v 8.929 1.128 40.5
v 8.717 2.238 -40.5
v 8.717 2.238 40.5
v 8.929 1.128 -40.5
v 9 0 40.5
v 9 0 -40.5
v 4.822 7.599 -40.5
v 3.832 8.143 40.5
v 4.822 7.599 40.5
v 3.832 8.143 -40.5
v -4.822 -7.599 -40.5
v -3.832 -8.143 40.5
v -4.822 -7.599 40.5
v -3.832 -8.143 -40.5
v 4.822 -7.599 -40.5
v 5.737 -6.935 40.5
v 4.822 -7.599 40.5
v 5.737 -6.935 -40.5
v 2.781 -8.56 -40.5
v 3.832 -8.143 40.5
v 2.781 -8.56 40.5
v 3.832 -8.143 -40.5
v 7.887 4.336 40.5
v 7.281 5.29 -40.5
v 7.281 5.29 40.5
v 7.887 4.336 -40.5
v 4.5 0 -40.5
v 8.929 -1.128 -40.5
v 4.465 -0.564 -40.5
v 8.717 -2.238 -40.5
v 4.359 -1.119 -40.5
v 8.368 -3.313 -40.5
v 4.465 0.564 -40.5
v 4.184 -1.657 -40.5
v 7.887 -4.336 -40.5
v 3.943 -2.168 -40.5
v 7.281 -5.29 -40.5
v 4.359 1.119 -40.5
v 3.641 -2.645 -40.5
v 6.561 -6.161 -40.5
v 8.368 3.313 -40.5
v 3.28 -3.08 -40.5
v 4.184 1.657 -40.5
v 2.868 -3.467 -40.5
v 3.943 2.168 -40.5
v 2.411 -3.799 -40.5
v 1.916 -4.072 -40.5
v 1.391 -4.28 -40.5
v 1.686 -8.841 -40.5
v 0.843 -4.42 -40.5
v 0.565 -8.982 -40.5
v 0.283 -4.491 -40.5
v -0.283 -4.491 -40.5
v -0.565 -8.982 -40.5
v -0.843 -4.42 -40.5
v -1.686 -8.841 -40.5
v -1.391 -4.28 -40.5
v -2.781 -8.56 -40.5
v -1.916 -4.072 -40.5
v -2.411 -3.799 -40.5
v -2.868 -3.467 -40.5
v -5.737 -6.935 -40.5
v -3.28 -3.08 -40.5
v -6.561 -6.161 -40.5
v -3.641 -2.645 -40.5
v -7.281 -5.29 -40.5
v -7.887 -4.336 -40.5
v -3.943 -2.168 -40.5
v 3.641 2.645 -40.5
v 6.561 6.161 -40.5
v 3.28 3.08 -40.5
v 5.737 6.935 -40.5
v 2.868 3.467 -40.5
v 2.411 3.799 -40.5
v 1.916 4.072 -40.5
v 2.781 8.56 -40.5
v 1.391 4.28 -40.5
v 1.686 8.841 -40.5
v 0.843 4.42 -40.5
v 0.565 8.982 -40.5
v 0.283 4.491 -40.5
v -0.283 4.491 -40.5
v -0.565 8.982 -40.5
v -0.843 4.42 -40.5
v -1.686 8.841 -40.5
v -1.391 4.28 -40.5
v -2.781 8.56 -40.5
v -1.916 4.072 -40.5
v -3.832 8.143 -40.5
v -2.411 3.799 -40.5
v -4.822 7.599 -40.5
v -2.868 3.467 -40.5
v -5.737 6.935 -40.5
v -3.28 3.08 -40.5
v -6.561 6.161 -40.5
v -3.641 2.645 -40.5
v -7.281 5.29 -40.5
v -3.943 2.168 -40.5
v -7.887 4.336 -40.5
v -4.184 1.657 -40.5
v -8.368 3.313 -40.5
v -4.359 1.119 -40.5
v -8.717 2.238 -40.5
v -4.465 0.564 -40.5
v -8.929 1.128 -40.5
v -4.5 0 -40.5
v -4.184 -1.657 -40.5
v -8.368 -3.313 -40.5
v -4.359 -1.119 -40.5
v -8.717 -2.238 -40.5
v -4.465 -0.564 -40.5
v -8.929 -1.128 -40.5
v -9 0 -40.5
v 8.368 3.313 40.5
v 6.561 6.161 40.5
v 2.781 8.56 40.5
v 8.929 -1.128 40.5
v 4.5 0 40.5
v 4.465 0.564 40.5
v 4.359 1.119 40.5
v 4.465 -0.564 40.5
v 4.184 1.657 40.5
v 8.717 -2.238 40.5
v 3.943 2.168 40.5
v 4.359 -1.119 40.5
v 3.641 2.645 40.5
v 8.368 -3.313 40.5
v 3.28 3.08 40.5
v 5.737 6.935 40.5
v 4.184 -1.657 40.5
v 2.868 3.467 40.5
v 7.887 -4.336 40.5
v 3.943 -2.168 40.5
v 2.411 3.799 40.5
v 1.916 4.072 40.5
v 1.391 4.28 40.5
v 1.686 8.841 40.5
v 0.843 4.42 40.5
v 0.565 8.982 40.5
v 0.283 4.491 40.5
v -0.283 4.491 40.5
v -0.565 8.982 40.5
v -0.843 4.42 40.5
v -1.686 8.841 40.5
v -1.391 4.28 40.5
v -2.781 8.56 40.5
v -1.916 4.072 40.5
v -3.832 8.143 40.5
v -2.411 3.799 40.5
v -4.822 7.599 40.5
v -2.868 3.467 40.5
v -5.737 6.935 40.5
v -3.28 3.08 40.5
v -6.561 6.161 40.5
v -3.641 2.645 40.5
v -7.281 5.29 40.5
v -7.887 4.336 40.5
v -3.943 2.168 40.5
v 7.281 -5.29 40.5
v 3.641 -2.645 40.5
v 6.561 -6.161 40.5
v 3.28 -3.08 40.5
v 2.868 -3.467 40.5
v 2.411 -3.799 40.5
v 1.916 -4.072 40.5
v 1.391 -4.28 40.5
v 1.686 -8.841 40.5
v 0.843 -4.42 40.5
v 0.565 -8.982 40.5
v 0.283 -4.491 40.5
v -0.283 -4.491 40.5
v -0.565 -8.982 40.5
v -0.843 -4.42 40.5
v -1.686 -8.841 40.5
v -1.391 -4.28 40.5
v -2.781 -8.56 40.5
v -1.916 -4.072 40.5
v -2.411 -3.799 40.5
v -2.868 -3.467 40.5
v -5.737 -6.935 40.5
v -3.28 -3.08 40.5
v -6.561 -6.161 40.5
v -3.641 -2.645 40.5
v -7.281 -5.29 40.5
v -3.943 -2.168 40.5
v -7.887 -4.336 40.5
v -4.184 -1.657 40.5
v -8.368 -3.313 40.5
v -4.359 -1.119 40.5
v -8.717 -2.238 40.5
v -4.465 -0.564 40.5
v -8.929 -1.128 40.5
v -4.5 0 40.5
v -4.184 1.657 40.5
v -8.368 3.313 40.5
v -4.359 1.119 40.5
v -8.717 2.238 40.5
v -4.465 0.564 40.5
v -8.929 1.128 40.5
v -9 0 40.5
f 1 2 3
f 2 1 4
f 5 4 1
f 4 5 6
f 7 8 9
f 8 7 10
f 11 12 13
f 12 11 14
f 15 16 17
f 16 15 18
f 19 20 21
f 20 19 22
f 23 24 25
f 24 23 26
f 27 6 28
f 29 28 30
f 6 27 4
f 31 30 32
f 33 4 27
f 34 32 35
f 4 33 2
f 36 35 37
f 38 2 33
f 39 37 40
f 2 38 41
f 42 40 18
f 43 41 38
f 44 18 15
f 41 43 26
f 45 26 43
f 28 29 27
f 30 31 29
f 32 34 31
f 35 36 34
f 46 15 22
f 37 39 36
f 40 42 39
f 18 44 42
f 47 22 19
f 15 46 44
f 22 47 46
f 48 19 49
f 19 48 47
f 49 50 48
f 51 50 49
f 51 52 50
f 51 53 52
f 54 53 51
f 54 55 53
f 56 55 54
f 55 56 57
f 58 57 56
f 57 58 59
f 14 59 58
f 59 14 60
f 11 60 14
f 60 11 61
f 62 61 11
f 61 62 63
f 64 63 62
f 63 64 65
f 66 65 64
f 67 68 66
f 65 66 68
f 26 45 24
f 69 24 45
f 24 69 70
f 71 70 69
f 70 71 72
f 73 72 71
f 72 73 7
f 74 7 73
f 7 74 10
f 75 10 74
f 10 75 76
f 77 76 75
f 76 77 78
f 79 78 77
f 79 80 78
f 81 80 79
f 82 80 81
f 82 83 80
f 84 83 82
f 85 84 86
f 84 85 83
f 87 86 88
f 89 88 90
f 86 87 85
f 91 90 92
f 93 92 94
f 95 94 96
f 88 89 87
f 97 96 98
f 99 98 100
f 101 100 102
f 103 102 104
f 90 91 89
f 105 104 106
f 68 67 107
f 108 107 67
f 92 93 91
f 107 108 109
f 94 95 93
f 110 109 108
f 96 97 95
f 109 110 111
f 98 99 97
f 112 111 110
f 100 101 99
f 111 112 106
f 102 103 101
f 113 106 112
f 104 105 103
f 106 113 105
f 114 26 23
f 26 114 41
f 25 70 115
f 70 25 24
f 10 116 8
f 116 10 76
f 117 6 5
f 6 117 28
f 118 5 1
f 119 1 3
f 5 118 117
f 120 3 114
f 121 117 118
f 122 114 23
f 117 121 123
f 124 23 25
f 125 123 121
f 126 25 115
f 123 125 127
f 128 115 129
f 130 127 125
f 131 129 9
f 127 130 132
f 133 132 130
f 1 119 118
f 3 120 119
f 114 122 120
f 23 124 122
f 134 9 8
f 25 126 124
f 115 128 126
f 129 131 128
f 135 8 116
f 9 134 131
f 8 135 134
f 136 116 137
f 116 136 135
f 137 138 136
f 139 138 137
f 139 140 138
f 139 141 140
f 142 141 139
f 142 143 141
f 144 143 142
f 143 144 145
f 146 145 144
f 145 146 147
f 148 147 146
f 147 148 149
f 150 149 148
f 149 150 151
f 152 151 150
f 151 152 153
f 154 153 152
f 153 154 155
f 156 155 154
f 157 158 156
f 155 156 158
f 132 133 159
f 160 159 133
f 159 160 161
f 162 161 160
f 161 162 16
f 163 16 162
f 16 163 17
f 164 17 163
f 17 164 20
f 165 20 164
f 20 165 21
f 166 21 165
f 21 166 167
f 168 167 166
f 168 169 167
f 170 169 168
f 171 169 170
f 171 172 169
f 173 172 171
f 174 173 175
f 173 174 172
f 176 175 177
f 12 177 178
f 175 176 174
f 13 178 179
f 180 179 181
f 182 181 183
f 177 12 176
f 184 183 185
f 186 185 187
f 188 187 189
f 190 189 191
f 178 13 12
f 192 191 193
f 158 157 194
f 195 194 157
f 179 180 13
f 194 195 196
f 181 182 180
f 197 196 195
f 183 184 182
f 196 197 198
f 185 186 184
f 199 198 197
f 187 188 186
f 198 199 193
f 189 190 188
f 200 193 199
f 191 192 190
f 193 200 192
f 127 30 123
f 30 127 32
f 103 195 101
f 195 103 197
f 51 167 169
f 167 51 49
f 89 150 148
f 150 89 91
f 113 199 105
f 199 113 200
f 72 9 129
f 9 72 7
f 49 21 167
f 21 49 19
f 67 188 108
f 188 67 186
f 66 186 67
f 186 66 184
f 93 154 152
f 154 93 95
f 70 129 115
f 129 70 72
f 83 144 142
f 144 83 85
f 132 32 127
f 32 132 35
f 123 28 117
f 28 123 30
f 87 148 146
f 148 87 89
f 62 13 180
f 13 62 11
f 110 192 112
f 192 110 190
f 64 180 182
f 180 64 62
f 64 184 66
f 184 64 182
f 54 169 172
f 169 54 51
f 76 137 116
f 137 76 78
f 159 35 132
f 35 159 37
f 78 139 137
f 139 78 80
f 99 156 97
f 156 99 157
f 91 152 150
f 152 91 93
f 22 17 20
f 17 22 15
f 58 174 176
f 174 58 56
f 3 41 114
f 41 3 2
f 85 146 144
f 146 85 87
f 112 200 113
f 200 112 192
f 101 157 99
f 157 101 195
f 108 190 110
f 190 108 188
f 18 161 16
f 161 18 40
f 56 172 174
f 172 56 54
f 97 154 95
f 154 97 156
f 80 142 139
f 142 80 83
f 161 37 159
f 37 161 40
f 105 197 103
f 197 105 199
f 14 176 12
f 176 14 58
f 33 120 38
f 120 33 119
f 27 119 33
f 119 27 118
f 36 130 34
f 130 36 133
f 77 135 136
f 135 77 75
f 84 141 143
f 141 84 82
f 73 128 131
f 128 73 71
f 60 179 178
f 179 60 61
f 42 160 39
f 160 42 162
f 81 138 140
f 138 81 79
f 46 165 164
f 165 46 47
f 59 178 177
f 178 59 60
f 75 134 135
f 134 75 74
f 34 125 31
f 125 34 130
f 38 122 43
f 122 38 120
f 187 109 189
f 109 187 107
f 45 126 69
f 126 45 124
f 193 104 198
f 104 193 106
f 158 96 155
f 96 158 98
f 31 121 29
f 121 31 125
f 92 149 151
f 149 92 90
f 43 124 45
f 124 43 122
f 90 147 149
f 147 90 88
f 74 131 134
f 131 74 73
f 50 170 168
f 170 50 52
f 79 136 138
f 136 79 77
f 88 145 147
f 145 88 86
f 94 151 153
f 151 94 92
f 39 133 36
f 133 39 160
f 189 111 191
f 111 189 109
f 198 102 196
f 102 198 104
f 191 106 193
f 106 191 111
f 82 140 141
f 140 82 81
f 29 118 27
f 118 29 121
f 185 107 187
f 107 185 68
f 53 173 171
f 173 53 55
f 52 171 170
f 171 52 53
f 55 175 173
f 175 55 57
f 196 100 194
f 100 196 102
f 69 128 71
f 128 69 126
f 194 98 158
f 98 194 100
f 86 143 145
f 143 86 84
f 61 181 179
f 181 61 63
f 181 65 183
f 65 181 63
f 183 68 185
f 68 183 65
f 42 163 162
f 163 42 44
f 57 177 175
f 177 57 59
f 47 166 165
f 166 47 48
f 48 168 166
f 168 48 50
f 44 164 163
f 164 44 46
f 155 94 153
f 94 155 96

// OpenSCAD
$fn = 50;


difference() {
	union() {
		translate(v = [0, 0, -40.5000000000]) {
			cylinder(h = 81, r = 9.0000000000);
		}
	}
	union() {
		translate(v = [0, 0, -100.0000000000]) {
			cylinder(h = 200, r = 4.5000000000);
		}
	}
}
